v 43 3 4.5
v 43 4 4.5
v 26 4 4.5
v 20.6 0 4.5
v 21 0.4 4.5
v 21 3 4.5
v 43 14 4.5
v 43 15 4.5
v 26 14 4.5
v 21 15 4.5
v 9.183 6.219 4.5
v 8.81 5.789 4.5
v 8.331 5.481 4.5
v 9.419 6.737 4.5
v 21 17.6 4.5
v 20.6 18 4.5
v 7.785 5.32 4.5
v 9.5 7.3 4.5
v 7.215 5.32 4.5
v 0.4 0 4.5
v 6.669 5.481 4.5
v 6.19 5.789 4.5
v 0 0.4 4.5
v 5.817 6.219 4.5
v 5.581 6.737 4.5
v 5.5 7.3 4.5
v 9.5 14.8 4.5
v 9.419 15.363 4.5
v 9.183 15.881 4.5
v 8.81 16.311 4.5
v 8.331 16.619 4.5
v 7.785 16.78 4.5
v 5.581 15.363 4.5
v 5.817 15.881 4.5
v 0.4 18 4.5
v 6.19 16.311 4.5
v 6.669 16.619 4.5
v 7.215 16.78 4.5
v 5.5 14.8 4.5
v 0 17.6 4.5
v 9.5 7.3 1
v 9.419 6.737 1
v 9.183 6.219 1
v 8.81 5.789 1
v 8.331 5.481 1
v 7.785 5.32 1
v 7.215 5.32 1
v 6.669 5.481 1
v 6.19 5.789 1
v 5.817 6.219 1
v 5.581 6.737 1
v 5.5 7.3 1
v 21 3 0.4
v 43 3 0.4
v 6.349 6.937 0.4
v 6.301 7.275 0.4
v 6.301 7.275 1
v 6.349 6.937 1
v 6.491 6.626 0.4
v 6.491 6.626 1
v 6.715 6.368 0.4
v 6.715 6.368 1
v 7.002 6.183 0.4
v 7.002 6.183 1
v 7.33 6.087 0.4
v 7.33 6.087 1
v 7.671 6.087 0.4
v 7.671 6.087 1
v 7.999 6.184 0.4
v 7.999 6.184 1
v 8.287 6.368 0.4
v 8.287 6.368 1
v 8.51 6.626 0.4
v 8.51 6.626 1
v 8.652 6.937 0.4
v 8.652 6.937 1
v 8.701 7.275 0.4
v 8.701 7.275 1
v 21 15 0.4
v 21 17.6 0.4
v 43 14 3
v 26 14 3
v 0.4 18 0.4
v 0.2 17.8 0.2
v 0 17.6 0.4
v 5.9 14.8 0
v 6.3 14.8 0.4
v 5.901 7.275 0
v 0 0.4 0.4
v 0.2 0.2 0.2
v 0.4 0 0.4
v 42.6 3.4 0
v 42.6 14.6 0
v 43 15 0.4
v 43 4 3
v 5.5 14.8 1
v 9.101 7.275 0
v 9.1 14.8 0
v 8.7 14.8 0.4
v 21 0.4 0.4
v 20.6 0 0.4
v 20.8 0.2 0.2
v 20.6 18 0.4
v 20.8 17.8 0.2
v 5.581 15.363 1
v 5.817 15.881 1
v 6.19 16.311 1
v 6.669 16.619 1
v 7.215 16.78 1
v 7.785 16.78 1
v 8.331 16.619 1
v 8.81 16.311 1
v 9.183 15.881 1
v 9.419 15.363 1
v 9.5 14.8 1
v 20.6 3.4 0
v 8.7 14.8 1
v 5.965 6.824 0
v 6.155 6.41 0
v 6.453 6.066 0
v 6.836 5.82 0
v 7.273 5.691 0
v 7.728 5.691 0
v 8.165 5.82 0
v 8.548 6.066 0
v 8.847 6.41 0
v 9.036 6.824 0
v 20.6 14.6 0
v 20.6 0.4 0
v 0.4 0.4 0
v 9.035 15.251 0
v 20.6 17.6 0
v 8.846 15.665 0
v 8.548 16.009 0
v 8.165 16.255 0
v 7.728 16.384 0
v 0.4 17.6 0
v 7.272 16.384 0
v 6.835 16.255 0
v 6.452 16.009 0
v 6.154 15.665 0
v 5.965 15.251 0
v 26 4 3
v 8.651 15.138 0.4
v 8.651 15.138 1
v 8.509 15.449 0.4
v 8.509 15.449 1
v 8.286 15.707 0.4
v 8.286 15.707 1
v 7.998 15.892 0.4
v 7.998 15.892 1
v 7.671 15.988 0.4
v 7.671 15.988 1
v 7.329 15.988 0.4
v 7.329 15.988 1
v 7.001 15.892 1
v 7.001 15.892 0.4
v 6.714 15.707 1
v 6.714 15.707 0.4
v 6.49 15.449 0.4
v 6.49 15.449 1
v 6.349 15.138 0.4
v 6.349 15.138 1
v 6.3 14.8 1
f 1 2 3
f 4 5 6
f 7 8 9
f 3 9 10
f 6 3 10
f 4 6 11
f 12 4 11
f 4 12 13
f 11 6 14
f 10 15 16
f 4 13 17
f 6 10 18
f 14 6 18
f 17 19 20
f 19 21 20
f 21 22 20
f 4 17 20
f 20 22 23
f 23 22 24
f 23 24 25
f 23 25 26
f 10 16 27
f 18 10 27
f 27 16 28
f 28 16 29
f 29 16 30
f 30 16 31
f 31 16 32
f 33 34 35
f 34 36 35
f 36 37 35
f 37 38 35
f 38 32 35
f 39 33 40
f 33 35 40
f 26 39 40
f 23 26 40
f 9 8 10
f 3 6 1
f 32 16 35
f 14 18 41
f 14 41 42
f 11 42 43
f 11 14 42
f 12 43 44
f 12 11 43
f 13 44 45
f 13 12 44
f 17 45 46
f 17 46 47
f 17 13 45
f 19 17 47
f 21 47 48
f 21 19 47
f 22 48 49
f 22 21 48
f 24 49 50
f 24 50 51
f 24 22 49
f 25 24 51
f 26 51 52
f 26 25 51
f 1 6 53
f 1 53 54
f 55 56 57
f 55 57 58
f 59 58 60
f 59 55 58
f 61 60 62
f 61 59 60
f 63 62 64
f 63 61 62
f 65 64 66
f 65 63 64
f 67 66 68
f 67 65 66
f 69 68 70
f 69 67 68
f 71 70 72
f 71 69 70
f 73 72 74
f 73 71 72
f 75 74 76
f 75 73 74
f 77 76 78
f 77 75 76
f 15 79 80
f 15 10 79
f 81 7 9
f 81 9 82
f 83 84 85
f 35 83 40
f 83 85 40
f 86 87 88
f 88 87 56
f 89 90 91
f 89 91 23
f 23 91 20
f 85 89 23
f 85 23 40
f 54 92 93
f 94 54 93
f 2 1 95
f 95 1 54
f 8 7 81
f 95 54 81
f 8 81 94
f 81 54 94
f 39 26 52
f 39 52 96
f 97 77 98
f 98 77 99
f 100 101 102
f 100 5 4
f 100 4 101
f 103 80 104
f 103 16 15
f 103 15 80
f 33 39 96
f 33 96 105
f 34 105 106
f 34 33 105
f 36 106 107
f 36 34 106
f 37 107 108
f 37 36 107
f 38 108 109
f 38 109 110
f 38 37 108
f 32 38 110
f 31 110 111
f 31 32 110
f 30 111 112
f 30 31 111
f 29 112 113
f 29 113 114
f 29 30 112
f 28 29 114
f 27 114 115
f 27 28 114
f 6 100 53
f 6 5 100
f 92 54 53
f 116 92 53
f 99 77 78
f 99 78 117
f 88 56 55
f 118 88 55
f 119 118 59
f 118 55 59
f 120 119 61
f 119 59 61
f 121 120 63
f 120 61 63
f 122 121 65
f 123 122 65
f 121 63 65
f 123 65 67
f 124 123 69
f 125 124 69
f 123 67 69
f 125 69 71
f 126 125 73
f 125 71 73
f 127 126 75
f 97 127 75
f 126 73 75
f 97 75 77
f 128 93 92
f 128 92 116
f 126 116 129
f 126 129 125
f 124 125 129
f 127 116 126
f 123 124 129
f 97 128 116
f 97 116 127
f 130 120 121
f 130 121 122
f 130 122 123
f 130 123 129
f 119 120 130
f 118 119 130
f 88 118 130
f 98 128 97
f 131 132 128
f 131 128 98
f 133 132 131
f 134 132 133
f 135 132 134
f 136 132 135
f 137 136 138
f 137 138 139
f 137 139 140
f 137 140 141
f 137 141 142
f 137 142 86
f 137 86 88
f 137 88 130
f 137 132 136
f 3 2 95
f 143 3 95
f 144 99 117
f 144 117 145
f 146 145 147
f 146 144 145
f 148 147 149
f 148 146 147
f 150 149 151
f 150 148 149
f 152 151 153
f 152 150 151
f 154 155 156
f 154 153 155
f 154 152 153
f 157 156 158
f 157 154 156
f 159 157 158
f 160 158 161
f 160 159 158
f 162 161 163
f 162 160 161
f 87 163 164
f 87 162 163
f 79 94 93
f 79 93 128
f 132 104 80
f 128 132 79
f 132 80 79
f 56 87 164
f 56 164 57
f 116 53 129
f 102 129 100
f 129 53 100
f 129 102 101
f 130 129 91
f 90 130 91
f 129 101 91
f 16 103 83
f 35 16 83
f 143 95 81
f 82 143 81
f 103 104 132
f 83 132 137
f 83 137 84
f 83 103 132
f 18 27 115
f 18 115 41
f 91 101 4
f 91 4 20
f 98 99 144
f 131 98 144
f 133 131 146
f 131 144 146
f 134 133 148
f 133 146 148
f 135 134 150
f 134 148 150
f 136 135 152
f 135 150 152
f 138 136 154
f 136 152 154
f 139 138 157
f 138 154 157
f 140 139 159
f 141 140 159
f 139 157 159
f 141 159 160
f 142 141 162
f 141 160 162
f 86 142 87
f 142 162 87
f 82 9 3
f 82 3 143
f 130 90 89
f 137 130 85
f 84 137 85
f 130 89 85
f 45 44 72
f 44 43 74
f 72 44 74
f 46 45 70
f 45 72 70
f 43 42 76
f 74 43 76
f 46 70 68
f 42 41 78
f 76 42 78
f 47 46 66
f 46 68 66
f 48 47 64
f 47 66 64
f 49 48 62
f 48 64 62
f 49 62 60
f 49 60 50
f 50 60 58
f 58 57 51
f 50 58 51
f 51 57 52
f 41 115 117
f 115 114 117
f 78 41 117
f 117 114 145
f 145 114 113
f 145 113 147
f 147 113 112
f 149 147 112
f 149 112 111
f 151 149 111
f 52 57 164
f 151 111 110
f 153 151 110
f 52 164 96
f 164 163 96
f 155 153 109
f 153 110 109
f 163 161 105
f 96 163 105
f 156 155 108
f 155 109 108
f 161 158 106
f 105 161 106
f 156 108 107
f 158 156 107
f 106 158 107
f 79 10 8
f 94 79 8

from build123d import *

# Parameters (mm, degrees)
SKETCH1_W           = 43
SKETCH1_H           = 18
BOSS_EXTRUDE1_DEPTH = 4.5
SKETCH2_W           = 22
SKETCH2_H           = 3
CUT_EXTRUDE1_DEPTH  = 47.832147079
SKETCH3_W           = 22
SKETCH3_H           = 3
CUT_EXTRUDE2_DEPTH  = 47.832147079
CUT_EXTRUDE3_DEPTH  = 3.5
CUT_EXTRUDE4_DEPTH  = 47.832147079
SKETCH6_W           = 1.5
SKETCH6_H           = 10
CUT_EXTRUDE5_DEPTH  = 17
CHAMFER1_SIZE       = 0.4
CHAMFER2_SIZE       = 0.4


with BuildPart() as part:
    # Sketch1 → Boss-Extrude1 (new body)
    with BuildSketch(Plane(origin=(0, 0, 0), x_dir=(-1, 0, 0), z_dir=(0, 0, -1))):
        with Locations((-21.5, 9)):
            Rectangle(SKETCH1_W, SKETCH1_H)
    extrude(amount=-BOSS_EXTRUDE1_DEPTH)

    # Sketch2 → Cut-Extrude1 (cut, through all)
    with BuildSketch(Plane.XY.offset(4.5)):
        with Locations((32, 1.5)):
            Rectangle(SKETCH2_W, SKETCH2_H)
    extrude(amount=-CUT_EXTRUDE1_DEPTH, mode=Mode.SUBTRACT)

    # Sketch3 → Cut-Extrude2 (cut, through all)
    with BuildSketch(Plane.XY.offset(4.5)):
        with Locations((32, 16.5)):
            Rectangle(SKETCH3_W, SKETCH3_H)
    extrude(amount=-CUT_EXTRUDE2_DEPTH, mode=Mode.SUBTRACT)

    # Sketch4 → Cut-Extrude3 (cut)
    with BuildSketch(Plane.XY.offset(4.5)):
        with BuildLine():
            Line((9.5, 14.8), (9.5, 7.3))
            ThreePointArc((9.5, 7.3), (7.5, 5.3), (5.5, 7.3))
            Line((5.5, 7.3), (5.5, 14.8))
            ThreePointArc((5.5, 14.8), (7.5, 16.8), (9.5, 14.8))
        make_face()
    extrude(amount=-CUT_EXTRUDE3_DEPTH, mode=Mode.SUBTRACT)

    # Sketch5 → Cut-Extrude4 (cut, through all)
    with BuildSketch(Plane(origin=(0, 0, 0), x_dir=(-1, 0, 0), z_dir=(0, 0, -1))):
        with BuildLine():
            Line((-6.300000004, 14.79990089), (-6.300621502, 7.27497794))
            ThreePointArc((-6.300621502, 7.27497794), (-7.500720608, 6.075077054), (-8.700621494, 7.27517616))
            Line((-8.700621494, 7.27517616), (-8.699999996, 14.80009911))
            ThreePointArc((-8.699999996, 14.80009911), (-7.49990089, 15.999999996), (-6.300000004, 14.79990089))
        make_face()
    extrude(amount=-CUT_EXTRUDE4_DEPTH, mode=Mode.SUBTRACT)

    # Sketch6 → Cut-Extrude5 (cut)
    with BuildSketch(Plane(origin=(43, 0, 0), x_dir=(0, 0, -1), z_dir=(1, 0, 0))):
        with Locations((-3.75, 9)):
            Rectangle(SKETCH6_W, SKETCH6_H)
    extrude(amount=-CUT_EXTRUDE5_DEPTH, mode=Mode.SUBTRACT)

    # Chamfer1
    chamfer1_edges = [part.edges().sort_by_distance(p)[0] for p in [
        (10.5, 0, 0),
        (21, 1.5, 0),
        (32, 3, 0),
        (43, 9, 0),
        (21, 16.5, 0),
        (32, 15, 0),
        (0, 9, 0),
        (10.5, 18, 0),
        (7.49990089, 15.999999996, 0),
        (8.700310745, 11.037637635, 0),
        (7.500720608, 6.075077054, 0),
        (6.300310753, 11.037439415, 0),
    ]]
    chamfer(chamfer1_edges, length=CHAMFER1_SIZE)

    # Chamfer2
    chamfer2_edges = [part.edges().sort_by_distance(p)[0] for p in [
        (21, 18, 2.45),
        (21, 0, 2.45),
        (0, 18, 2.45),
        (0, 0, 2.45),
    ]]
    chamfer(chamfer2_edges, length=CHAMFER2_SIZE)


solid = part.part
